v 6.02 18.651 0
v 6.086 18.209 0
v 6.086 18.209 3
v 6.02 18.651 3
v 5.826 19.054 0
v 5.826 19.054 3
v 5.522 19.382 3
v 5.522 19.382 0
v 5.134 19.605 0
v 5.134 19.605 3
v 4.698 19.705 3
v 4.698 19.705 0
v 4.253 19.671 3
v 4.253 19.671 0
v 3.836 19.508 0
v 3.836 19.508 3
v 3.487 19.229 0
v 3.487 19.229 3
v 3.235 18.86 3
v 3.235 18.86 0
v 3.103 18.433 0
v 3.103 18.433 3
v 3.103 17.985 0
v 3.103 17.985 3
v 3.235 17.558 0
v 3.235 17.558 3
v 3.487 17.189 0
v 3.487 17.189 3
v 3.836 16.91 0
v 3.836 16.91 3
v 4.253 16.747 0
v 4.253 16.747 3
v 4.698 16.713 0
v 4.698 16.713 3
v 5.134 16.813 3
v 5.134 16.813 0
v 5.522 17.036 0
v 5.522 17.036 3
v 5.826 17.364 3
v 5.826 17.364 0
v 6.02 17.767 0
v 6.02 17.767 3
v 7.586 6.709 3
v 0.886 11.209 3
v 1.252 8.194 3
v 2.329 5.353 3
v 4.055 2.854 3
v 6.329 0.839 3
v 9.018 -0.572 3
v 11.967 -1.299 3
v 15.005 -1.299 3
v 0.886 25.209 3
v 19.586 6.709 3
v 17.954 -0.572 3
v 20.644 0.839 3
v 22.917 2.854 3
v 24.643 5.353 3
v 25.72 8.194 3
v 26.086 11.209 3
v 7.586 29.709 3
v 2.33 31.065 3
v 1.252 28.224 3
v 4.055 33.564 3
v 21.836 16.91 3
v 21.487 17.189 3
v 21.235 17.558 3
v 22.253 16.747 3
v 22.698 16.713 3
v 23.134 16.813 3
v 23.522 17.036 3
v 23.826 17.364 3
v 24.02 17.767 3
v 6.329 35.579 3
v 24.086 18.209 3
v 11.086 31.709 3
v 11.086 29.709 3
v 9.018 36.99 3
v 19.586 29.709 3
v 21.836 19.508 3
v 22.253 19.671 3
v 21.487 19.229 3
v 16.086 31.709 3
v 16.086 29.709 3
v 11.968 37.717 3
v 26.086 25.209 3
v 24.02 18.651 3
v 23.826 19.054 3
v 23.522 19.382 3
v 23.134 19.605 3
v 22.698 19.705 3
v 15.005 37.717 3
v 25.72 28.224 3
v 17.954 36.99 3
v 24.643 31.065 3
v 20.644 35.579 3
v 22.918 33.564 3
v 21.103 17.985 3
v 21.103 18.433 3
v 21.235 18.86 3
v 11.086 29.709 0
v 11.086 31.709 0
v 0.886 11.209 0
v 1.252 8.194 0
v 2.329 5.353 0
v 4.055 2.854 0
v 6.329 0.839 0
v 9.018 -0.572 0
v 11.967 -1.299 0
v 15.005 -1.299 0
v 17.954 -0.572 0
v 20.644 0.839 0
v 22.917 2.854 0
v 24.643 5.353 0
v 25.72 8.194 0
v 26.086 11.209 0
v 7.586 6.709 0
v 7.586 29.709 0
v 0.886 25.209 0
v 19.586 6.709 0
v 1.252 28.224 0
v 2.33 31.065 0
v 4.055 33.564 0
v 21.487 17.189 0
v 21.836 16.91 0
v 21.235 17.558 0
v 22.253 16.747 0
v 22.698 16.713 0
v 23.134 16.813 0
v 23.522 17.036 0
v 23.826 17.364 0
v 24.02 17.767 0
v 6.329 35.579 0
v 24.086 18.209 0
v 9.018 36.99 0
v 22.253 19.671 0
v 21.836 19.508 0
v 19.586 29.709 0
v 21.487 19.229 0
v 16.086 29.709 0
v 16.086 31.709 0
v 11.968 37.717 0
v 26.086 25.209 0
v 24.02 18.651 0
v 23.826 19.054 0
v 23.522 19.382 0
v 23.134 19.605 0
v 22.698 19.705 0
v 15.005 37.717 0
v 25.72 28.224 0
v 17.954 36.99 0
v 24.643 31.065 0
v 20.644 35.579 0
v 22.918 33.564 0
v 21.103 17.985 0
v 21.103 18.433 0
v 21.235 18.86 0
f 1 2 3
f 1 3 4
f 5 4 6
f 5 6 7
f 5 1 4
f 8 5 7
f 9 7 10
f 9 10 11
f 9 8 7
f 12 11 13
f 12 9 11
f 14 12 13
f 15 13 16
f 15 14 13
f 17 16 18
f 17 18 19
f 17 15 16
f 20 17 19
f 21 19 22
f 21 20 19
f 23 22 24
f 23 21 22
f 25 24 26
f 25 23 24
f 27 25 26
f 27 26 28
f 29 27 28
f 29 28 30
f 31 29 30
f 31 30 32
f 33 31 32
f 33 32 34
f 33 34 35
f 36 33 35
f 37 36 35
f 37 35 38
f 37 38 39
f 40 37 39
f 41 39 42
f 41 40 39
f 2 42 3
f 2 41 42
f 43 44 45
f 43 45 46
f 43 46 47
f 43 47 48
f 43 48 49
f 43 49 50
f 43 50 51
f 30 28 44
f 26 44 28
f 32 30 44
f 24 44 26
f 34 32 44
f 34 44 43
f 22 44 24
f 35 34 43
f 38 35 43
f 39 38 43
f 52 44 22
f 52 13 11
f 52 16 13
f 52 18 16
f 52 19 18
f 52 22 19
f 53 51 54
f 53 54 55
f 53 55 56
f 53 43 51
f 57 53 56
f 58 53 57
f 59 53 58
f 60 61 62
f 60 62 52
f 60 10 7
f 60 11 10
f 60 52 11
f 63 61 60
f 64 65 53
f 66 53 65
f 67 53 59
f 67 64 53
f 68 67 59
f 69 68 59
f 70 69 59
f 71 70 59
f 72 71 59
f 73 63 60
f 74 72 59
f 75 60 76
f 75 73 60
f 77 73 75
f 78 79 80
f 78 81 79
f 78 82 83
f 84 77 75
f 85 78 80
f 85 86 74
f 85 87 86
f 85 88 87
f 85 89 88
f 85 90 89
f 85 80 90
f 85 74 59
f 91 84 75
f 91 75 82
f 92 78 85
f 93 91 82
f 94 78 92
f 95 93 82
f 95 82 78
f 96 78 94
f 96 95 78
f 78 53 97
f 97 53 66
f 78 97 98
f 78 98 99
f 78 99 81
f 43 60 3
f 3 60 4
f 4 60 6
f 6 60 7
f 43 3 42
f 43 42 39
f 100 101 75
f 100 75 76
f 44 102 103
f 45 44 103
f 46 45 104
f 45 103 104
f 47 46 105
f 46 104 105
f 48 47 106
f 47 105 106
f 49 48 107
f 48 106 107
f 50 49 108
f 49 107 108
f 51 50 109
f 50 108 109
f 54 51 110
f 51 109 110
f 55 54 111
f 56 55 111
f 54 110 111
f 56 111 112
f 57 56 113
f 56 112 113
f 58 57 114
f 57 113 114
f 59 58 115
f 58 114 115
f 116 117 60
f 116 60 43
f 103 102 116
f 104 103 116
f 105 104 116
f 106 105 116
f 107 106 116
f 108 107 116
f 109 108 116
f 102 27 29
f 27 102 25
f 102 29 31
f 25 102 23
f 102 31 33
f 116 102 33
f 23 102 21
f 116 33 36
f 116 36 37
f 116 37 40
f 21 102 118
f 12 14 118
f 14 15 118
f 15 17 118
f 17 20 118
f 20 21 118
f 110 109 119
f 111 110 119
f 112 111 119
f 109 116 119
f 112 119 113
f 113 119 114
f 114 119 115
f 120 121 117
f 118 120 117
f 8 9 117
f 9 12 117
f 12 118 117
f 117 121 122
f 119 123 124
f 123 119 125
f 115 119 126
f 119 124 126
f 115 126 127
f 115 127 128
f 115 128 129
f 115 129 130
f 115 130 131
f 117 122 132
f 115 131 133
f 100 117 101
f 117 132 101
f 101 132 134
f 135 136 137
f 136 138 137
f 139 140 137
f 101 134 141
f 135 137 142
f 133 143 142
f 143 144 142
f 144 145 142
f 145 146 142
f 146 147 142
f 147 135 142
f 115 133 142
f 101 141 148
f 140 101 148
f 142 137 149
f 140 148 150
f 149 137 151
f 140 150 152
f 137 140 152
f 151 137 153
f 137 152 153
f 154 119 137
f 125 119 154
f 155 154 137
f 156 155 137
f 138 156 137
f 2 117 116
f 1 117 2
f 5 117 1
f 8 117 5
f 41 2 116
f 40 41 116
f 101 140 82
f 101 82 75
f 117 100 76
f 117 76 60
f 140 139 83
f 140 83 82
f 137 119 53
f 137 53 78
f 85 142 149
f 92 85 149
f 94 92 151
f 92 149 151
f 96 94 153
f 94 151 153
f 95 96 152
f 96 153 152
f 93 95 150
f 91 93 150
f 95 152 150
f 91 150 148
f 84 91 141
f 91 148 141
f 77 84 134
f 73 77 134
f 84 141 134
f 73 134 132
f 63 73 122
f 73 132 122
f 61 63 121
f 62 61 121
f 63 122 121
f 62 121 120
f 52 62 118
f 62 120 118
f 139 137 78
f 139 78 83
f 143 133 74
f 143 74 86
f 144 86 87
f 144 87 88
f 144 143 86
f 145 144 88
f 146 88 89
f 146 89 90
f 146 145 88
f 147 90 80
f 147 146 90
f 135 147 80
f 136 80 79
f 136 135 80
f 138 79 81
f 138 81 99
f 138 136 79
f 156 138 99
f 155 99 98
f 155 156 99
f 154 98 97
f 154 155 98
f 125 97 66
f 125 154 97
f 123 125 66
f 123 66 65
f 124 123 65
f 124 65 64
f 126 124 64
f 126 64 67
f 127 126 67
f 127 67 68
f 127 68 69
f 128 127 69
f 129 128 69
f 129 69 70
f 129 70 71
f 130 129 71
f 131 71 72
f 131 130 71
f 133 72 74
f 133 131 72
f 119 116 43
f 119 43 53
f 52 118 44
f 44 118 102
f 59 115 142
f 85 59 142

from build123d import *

# Parameters (mm, degrees)
MODEL_R             = 1.5
BOSS_EXTRUDE1_DEPTH = 3


with BuildPart() as part:
    # Model → Boss-Extrude1 (new body)
    with BuildSketch(Plane.XY):
        with BuildLine():
            Line((0.88624, 25.209089561), (0.88624, 11.208991882))
            ThreePointArc((0.88624, 11.208991882), (13.486238839, -1.391009279), (26.08624, 11.20898956))
            Line((26.08624, 11.20898956), (26.08624, 16.208989561))
            Line((26.08624, 16.208989561), (26.08624, 25.208989561))
            ThreePointArc((26.08624, 25.208989561), (13.48629, 37.809039561), (0.88624, 25.209089561))
        make_face()
        with Locations((4.586289997, 18.209039557)):
            Circle(MODEL_R, mode=Mode.SUBTRACT)
        with Locations((22.586289997, 18.209039557)):
            Circle(MODEL_R, mode=Mode.SUBTRACT)
        Polygon((19.58624, 6.708989561), (19.58624, 29.708989561), (16.08624, 29.708989561), (16.08624, 31.708989561), (11.08624, 31.708989561), (11.08624, 29.708989561), (7.58624, 29.708989561), (7.58624, 6.708989561), align=None, mode=Mode.SUBTRACT)
    extrude(amount=BOSS_EXTRUDE1_DEPTH)


solid = part.part
